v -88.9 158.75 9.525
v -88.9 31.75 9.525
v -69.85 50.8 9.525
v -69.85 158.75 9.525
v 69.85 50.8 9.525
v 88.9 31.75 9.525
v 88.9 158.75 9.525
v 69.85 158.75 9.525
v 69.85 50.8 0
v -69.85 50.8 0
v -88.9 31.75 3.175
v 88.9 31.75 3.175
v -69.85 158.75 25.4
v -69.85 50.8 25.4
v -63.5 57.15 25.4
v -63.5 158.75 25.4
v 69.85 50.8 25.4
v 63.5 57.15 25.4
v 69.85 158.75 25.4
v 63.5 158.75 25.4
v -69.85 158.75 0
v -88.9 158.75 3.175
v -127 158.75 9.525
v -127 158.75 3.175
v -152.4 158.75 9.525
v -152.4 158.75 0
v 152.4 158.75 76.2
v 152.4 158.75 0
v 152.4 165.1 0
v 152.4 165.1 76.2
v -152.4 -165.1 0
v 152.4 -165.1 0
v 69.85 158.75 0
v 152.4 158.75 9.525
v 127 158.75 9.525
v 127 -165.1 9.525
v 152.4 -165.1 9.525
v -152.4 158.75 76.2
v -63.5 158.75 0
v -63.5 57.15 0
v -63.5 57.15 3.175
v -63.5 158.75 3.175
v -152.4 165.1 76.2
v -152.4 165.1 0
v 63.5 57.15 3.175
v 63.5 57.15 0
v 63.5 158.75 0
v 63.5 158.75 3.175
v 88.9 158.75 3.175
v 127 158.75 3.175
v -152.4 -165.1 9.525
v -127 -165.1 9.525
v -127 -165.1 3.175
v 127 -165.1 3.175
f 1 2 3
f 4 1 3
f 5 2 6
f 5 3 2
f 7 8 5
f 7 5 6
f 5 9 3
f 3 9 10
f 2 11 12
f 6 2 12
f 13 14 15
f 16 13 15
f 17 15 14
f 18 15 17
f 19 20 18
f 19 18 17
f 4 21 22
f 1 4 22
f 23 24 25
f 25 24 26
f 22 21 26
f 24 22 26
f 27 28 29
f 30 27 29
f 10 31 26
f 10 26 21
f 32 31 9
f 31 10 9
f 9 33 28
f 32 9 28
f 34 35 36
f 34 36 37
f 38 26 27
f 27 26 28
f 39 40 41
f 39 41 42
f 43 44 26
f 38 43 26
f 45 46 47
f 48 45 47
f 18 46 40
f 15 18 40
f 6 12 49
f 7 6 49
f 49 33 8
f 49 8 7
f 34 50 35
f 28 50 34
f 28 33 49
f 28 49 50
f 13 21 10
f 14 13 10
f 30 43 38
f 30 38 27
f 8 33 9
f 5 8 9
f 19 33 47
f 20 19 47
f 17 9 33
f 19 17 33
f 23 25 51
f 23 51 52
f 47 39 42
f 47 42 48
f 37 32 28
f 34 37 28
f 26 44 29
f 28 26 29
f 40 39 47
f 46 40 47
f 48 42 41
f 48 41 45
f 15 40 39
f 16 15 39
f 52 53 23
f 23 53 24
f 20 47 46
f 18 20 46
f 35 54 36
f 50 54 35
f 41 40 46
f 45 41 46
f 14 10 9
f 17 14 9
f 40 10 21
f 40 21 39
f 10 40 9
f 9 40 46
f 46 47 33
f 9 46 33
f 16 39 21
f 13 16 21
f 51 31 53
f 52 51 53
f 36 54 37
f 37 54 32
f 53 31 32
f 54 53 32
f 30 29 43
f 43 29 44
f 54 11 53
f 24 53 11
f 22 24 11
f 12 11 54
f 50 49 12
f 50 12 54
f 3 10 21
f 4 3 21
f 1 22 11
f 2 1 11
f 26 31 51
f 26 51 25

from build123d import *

# Parameters (mm, degrees)
F0_W     = 127
F0_H     = 101.6
F1_DEPTH = 3.175
F0_W_2   = 25.4
F0_H_2   = 323.85
F2_DEPTH = 9.525
F3_DEPTH = 25.4
F4_DEPTH = 76.2


with BuildPart() as f1:
    # F0 (on Top) → F1 (new body)
    with BuildSketch(Plane.XY):
        Polygon((127, -165.1), (127, 158.75), (88.9, 158.75), (88.9, 31.75), (-88.9, 31.75), (-88.9, 158.75), (-127, 158.75), (-127, -165.1), align=None)
        with Locations((0, 107.95)):
            Rectangle(F0_W, F0_H)
    extrude(amount=F1_DEPTH)

    # F0 (on Top) → F2 (join)
    with BuildSketch(Plane.XY):
        with Locations((139.7, -3.175)):
            Rectangle(F0_W_2, F0_H_2)
        Polygon((88.9, 31.75), (88.9, 158.75), (69.85, 158.75), (69.85, 50.8), align=None)
        Polygon((-88.9, 31.75), (88.9, 31.75), (69.85, 50.8), (-69.85, 50.8), align=None)
        Polygon((-69.85, 158.75), (-88.9, 158.75), (-88.9, 31.75), (-69.85, 50.8), align=None)
        with Locations((-139.7, -3.175)):
            Rectangle(F0_W_2, F0_H_2)
    extrude(amount=F2_DEPTH)


with BuildPart() as f3:
    # F0 (on Top) → F3 (new body)
    with BuildSketch(Plane.XY):
        Polygon((-63.5, 158.75), (-69.85, 158.75), (-69.85, 50.8), (-63.5, 57.15), align=None)
        Polygon((-69.85, 50.8), (69.85, 50.8), (63.5, 57.15), (-63.5, 57.15), align=None)
        Polygon((69.85, 50.8), (69.85, 158.75), (63.5, 158.75), (63.5, 57.15), align=None)
    extrude(amount=F3_DEPTH)


with BuildPart() as f4:
    # F0 (on Top) → F4 (new body)
    with BuildSketch(Plane.XY):
        Polygon((152.4, 158.75), (152.4, 165.1), (-152.4, 165.1), (-152.4, 158.75), (-127, 158.75), (-88.9, 158.75), (-69.85, 158.75), (-63.5, 158.75), (63.5, 158.75), (69.85, 158.75), (88.9, 158.75), (127, 158.75), align=None)
    extrude(amount=F4_DEPTH)


solid = Compound([f1.part, f3.part, f4.part])
